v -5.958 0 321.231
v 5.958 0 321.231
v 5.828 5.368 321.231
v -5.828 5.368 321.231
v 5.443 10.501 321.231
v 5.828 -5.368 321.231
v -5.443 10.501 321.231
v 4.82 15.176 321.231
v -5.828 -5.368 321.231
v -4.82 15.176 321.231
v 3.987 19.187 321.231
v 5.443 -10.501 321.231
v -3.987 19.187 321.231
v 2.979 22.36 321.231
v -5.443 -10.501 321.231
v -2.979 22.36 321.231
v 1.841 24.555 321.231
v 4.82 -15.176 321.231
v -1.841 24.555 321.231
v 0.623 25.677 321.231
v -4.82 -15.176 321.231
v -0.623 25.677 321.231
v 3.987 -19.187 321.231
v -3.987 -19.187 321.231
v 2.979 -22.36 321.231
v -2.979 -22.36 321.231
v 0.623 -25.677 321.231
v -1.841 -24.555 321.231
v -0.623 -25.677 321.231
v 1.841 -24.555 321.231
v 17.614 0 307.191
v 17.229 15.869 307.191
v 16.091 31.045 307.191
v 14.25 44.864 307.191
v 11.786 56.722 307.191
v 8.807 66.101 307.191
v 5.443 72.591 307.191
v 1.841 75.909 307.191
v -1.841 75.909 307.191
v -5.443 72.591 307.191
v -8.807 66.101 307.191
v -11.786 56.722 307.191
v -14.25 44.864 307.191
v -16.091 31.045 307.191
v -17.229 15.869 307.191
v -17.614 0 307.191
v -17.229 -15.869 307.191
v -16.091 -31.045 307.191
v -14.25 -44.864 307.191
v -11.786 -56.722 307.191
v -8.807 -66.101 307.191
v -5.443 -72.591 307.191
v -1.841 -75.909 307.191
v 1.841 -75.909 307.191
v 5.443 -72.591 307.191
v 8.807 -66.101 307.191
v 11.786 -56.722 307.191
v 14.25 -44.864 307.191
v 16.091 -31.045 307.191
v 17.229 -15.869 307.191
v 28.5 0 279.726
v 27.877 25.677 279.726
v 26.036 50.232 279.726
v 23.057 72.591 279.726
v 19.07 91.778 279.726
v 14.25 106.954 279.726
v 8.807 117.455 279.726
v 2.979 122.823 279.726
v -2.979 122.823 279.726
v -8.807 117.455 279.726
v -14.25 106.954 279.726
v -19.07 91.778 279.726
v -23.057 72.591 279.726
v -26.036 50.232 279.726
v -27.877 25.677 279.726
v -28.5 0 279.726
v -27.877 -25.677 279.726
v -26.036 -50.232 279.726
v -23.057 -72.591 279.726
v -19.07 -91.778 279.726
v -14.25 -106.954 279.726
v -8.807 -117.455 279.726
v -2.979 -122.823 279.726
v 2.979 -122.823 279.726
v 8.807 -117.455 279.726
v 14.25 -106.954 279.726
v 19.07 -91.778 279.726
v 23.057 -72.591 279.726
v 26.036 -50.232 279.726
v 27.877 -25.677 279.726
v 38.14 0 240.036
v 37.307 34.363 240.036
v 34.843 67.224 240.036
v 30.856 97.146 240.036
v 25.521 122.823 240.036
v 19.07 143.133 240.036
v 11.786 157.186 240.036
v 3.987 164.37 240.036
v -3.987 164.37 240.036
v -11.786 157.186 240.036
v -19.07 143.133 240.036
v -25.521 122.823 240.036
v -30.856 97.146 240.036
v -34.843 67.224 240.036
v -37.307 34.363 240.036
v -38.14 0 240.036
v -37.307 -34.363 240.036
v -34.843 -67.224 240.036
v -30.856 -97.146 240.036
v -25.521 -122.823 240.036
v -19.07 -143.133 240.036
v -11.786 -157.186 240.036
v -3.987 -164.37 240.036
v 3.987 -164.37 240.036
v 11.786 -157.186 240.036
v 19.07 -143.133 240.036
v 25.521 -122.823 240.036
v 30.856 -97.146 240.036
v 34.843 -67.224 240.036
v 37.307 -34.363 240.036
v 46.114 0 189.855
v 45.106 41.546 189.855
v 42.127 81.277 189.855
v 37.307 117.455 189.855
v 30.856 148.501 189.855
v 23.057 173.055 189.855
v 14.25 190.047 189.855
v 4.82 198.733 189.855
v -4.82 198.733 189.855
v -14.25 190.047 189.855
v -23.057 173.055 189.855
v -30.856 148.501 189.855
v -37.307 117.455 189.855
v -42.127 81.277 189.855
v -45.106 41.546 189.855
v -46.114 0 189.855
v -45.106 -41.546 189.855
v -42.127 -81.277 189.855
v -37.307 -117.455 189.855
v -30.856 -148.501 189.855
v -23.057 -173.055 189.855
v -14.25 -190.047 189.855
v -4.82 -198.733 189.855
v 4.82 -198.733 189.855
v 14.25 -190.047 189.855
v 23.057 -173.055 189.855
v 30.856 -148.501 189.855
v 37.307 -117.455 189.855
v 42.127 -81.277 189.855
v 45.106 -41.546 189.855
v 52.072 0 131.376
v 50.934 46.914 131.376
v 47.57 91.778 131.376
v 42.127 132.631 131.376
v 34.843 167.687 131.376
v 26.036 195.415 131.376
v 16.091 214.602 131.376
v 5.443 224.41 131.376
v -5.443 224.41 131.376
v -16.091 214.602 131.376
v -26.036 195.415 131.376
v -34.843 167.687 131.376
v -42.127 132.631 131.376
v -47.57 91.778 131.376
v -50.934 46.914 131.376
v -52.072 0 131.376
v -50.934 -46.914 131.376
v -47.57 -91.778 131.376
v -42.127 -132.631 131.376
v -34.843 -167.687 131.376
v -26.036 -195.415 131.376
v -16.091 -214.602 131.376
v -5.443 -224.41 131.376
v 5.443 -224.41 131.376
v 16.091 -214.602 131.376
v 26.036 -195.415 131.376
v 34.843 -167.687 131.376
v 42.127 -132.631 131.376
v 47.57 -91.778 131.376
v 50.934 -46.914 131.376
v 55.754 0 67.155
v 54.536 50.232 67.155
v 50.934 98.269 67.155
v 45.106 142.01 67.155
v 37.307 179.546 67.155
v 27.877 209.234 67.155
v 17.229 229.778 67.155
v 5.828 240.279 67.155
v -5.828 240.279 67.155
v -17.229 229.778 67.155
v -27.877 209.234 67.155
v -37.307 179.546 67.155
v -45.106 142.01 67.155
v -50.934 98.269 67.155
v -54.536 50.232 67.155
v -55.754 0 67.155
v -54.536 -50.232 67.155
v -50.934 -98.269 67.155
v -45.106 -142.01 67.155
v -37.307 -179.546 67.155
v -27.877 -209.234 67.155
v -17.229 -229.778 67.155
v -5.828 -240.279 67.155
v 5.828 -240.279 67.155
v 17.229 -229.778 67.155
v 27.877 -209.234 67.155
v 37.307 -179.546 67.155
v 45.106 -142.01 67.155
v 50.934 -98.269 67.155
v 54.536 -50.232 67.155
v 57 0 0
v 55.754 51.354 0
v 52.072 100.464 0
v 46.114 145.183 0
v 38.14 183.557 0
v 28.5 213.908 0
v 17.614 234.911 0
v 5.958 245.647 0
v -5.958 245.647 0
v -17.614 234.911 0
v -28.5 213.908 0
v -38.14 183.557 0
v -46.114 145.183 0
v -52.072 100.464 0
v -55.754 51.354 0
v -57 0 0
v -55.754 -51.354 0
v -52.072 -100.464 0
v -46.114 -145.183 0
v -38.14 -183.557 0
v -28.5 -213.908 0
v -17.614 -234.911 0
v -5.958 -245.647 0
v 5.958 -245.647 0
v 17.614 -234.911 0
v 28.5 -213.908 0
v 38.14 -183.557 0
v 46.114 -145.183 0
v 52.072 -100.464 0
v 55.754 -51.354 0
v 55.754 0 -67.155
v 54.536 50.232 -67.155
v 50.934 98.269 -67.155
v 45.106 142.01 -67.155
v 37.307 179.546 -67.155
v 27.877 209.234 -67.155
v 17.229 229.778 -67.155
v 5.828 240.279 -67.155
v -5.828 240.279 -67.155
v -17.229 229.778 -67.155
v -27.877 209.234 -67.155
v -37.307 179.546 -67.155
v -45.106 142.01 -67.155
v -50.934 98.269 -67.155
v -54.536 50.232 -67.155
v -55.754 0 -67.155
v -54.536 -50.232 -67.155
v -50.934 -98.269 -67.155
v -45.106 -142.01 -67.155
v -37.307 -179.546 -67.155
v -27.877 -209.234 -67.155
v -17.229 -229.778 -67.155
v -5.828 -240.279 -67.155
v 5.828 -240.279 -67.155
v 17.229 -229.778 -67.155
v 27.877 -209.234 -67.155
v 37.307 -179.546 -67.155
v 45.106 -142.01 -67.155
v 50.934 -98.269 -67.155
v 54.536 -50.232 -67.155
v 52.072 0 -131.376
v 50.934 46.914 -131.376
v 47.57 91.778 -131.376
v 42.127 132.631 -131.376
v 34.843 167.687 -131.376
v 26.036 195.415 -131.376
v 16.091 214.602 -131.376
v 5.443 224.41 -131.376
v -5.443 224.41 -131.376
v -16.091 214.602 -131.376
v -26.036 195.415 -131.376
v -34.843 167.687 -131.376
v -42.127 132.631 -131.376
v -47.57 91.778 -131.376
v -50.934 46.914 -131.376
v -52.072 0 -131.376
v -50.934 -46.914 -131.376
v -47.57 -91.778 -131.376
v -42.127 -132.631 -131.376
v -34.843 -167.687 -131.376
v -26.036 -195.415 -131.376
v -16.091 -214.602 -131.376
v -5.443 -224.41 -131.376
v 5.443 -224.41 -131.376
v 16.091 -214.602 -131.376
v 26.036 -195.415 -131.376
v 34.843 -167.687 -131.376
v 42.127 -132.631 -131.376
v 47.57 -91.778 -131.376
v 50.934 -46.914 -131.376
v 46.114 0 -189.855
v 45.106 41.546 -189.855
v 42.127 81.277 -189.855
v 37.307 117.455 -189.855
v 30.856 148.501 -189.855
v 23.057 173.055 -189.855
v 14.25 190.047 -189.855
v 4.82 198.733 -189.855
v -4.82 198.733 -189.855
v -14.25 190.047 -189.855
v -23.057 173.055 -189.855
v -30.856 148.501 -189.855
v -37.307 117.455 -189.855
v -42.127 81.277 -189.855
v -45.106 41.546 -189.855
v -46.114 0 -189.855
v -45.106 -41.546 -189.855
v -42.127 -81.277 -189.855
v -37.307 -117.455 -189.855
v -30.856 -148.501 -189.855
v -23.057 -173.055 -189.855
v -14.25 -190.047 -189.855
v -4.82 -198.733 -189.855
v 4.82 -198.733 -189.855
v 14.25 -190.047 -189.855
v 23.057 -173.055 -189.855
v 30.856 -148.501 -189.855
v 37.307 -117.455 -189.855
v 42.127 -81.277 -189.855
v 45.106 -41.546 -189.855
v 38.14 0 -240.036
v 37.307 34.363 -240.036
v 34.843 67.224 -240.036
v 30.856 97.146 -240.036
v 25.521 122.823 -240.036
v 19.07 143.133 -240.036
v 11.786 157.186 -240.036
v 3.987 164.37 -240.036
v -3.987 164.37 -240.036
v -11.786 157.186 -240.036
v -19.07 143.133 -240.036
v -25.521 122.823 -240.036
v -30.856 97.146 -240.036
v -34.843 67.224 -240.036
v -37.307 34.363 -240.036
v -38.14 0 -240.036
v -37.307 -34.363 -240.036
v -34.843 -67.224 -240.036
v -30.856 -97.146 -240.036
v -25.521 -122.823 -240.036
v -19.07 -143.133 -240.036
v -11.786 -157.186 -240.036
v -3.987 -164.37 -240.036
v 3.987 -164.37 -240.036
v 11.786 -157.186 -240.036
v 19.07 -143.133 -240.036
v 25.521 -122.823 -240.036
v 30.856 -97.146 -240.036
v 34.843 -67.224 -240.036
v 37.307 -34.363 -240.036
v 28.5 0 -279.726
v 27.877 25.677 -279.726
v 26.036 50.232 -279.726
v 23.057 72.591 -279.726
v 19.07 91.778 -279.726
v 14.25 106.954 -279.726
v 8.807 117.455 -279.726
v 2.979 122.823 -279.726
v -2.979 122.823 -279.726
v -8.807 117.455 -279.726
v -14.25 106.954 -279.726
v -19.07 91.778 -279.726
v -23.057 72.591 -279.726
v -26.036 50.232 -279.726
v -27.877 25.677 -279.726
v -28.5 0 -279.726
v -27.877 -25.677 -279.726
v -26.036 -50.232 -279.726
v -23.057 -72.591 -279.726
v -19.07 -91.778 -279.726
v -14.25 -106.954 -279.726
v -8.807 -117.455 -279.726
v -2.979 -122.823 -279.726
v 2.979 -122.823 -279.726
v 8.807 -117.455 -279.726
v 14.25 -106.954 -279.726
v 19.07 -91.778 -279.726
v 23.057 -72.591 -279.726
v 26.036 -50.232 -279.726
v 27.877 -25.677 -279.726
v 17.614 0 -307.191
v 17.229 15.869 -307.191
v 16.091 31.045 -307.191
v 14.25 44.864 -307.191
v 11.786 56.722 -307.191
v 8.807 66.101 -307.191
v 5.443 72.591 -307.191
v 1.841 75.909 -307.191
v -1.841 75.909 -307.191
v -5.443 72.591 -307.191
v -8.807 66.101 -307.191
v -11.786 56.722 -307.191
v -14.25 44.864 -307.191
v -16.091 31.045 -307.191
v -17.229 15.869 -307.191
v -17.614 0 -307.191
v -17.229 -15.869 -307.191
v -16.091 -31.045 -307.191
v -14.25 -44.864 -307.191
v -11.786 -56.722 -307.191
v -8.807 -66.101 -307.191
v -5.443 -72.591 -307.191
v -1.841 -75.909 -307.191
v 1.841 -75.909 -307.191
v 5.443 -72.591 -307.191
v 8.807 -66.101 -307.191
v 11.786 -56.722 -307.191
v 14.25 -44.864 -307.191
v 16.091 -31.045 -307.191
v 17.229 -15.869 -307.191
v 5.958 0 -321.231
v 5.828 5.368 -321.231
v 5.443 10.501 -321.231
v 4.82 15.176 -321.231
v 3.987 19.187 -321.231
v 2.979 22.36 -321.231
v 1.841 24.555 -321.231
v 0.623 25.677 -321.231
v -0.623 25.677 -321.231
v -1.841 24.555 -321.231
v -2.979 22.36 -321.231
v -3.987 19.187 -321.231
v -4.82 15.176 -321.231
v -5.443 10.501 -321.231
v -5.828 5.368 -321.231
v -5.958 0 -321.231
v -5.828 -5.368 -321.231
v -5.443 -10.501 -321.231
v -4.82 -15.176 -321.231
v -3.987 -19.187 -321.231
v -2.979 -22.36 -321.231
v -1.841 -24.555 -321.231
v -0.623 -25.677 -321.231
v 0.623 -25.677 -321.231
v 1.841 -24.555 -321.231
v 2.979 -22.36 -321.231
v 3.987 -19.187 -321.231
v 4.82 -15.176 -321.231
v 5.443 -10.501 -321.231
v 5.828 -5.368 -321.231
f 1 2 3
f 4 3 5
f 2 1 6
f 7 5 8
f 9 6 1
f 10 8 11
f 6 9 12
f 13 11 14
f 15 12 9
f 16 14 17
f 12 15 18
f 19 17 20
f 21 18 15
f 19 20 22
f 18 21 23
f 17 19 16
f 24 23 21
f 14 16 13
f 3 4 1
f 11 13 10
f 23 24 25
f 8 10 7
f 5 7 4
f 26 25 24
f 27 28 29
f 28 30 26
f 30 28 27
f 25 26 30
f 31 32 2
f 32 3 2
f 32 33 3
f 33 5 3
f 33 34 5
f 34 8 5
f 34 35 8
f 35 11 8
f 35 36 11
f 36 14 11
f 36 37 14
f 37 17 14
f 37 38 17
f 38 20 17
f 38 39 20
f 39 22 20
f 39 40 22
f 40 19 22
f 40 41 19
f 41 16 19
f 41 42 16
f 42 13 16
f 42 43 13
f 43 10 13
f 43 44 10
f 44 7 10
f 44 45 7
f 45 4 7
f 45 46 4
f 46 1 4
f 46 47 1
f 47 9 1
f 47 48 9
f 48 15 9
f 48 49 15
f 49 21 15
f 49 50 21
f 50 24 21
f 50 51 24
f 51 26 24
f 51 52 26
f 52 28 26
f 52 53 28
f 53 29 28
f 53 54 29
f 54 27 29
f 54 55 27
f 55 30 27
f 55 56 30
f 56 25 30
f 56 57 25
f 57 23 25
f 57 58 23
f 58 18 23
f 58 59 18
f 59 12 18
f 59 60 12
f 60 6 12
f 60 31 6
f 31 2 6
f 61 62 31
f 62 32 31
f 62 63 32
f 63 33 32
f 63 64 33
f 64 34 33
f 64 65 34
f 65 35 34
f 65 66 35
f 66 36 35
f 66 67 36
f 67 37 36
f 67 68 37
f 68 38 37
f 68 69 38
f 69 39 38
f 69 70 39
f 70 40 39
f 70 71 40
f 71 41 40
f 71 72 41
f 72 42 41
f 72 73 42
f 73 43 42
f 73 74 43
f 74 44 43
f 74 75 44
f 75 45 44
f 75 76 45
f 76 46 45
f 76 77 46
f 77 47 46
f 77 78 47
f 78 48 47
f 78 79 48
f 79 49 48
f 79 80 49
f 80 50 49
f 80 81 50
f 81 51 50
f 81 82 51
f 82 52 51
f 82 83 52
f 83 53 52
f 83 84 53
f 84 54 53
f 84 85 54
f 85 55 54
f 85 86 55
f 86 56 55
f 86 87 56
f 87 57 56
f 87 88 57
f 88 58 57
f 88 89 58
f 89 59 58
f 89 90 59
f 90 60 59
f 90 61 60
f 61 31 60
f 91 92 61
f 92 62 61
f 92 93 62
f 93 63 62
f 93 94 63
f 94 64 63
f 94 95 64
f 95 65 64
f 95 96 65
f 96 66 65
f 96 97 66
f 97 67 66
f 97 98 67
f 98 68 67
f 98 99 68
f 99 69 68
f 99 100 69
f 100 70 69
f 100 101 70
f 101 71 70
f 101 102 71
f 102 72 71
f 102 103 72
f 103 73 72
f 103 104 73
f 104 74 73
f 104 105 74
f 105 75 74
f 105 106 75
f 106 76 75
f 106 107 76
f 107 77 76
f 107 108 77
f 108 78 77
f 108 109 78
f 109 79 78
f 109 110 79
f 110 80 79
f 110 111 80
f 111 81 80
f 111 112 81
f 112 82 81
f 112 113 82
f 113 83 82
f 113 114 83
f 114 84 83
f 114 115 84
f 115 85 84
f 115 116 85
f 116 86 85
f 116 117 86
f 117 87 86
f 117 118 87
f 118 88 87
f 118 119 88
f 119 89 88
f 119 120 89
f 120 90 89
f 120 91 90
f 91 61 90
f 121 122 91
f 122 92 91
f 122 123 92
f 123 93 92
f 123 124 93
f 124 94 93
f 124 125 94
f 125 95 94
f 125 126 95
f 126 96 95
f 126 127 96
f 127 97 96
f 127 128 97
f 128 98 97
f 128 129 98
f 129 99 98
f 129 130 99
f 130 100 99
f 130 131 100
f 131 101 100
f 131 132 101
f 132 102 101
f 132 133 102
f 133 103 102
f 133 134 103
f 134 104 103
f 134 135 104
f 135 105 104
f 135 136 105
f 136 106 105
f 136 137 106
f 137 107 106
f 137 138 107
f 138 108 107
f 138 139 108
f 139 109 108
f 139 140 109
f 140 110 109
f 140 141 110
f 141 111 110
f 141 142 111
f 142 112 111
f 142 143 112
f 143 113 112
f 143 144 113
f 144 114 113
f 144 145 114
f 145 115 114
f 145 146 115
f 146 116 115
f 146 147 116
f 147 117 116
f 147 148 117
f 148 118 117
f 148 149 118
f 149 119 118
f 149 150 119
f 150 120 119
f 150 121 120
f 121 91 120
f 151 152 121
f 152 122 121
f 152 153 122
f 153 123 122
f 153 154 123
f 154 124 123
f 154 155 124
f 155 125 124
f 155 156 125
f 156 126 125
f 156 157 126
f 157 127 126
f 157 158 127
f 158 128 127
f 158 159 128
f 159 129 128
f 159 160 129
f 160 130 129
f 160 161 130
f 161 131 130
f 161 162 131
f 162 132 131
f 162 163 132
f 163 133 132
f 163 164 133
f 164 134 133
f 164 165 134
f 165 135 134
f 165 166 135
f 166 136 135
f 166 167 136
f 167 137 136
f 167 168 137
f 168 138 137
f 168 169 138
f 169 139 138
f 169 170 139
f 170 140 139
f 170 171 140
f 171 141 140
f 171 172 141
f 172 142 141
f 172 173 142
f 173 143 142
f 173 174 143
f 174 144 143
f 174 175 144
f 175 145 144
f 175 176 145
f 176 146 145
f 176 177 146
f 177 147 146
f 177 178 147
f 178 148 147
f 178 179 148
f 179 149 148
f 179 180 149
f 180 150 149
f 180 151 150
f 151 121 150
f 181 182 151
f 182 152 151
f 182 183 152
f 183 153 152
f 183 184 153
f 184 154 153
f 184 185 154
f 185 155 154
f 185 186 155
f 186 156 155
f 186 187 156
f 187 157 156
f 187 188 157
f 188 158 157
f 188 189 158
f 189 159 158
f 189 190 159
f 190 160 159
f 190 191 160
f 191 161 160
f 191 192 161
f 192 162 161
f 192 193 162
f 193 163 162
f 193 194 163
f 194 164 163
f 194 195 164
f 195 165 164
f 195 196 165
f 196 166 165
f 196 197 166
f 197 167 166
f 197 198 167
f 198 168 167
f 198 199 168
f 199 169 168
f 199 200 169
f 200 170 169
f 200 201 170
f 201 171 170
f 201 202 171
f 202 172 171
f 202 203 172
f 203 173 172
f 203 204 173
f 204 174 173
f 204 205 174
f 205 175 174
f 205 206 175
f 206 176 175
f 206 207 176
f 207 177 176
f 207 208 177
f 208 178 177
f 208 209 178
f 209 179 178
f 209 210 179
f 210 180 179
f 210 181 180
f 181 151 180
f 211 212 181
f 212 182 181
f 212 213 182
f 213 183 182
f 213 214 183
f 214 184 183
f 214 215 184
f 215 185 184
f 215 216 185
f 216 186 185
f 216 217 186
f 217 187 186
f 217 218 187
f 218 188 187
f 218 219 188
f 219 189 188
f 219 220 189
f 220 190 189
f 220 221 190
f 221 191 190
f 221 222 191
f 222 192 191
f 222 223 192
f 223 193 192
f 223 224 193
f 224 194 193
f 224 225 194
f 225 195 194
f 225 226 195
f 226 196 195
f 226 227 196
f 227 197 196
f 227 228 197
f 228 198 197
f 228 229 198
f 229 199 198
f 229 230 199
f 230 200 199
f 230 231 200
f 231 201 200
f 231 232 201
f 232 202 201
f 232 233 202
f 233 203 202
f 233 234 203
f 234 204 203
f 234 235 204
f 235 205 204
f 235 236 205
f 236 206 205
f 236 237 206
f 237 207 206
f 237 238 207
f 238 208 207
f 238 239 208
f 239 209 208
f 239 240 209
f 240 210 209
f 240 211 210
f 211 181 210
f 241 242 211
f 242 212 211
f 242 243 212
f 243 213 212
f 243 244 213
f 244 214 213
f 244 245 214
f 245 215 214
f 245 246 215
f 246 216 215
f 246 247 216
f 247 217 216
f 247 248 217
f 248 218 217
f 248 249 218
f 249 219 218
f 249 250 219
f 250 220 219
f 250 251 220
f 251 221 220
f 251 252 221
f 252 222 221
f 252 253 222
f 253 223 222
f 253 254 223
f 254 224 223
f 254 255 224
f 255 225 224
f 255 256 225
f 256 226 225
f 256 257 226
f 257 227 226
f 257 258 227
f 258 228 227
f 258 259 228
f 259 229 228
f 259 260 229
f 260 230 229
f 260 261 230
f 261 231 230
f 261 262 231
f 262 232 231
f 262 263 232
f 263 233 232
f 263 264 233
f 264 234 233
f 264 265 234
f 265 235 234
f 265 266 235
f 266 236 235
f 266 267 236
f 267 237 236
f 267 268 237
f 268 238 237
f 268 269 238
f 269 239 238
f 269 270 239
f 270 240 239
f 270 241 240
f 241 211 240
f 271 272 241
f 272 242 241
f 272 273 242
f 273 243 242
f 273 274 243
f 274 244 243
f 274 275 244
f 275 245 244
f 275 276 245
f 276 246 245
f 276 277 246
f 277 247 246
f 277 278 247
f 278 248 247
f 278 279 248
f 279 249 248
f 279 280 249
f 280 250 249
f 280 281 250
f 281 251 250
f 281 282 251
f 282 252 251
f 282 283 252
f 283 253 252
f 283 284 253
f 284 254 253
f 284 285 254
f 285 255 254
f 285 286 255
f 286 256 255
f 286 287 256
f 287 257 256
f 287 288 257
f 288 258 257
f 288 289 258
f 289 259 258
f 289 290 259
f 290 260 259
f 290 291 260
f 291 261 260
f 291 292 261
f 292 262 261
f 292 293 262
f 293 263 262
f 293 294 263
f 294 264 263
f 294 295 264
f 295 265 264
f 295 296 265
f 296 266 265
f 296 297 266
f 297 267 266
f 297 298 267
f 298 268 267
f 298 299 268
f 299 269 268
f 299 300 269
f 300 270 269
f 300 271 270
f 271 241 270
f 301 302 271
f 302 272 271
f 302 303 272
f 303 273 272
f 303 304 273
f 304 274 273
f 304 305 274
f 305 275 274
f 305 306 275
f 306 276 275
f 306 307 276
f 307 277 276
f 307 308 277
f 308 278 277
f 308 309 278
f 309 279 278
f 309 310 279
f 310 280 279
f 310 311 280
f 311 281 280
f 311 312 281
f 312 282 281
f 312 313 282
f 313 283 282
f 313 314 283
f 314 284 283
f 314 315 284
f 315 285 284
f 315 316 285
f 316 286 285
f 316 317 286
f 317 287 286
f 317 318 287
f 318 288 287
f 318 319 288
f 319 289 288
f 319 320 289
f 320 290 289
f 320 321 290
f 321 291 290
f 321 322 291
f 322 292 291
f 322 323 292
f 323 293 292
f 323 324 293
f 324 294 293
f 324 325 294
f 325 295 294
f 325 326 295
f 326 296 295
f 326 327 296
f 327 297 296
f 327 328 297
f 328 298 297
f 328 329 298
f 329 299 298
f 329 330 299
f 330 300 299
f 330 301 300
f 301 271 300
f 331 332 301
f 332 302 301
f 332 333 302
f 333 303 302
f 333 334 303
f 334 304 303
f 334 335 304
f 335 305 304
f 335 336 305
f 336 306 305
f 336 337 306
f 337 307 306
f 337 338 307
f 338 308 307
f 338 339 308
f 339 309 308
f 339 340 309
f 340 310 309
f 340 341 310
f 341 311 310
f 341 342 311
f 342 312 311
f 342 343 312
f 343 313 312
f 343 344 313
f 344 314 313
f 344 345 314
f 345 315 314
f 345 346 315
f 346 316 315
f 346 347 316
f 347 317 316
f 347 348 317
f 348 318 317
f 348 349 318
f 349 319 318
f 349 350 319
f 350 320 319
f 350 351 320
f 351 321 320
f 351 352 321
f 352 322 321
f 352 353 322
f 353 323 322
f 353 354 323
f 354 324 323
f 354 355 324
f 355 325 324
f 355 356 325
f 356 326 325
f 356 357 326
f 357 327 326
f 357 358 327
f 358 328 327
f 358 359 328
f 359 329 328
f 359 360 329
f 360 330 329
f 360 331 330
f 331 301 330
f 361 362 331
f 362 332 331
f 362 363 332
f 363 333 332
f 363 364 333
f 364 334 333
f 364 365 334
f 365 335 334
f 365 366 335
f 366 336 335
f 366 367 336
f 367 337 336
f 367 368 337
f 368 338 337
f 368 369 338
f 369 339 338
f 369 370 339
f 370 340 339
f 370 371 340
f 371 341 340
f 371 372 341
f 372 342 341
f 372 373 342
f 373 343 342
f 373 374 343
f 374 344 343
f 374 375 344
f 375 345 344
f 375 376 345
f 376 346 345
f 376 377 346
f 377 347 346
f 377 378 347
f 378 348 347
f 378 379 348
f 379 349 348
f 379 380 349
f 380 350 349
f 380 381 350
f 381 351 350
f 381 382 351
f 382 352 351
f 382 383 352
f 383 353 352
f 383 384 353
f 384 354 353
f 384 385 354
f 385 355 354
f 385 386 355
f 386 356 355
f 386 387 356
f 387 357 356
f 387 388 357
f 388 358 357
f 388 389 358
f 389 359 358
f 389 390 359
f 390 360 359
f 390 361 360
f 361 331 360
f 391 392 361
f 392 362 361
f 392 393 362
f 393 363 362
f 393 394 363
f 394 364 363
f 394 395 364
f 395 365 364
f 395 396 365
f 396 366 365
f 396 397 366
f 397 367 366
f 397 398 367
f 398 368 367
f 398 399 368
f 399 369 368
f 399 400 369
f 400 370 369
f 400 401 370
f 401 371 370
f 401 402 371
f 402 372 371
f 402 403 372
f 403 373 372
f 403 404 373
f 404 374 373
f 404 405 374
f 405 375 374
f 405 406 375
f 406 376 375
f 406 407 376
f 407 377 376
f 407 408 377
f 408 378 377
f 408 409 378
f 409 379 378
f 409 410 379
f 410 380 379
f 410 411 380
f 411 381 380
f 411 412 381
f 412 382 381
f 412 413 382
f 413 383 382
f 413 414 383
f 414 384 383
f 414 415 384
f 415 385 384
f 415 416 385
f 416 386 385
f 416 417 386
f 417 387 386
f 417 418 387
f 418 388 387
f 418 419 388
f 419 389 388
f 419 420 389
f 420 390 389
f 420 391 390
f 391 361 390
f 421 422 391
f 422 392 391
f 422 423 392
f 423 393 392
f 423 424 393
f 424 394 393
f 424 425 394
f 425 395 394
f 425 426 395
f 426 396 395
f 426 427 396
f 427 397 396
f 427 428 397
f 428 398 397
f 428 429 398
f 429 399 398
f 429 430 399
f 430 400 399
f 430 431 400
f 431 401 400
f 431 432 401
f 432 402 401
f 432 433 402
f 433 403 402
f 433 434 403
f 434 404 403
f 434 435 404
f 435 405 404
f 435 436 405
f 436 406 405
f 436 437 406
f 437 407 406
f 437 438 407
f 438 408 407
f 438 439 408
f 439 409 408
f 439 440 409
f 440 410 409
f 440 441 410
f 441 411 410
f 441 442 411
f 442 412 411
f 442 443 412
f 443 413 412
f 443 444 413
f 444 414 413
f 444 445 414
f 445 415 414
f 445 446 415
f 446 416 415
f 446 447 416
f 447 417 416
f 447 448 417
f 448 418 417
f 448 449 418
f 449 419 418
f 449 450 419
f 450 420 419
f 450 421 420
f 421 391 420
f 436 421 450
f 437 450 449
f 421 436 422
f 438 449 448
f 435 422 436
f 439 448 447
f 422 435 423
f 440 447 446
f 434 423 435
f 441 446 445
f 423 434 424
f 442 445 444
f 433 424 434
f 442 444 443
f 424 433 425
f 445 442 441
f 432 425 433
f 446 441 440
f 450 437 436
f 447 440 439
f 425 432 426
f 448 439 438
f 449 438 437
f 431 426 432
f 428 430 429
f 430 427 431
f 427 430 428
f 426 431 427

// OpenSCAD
// Generated by SolidPython 1.0.1 on 2020-07-29 00:46:45


scale(v = [3, 13, 17]) {
	sphere(r = 19);
}
/***********************************************
*********      SolidPython code:      **********
************************************************
 
# import packages: SolidPython
from solid import *
from solid.utils import *
from itertools import chain, combinations, permutations


class Resize:

    def __init__(self, scad_file):
        self.scad_file = scad_file
        #self.scad_file = import_scad(scad_file)
        # cone/cylinder param:
        self.r1 = 0
        self.r2 = 0
        self.h = 0
        # rectangular prism param:
        self.w = 0
        self.l = 0
        # ellipse param:
        self.r = 0

    # import OpenScad code (file name corresponds to shape)


    # classify shape + parameters
    def assign(self, param1, param2, param3):
        if self.scad_file == 'cone.scad':
            self.r1 = param1
            self.r2 = param2
            self.h = param3
        elif self.scad_file == 'cylinder.scad':
            self.r1 = param1
            self.r2 = param2
            self.h = param3
        elif self.scad_file == 'rectangularPrism.scad':
            self.h = param1
            self.l = param2
            self.w = param3
        else:
            self.r = param1
            self.h = param2

    # resize parameters
    def iterate(self):
        x = range(3, 20, 2)
        i = 1
        if self.scad_file == 'cone.scad':
            tempList = list(permutations(x, 2))
            for temp in tempList:
                param1 = temp[0]
                param2 = temp[1]
                filepath = 'produced_scad_files/' + 'cone' + str(param1) + '_' + str(param2) + '_' + '.scad'
                scad_render_to_file(cylinder(h=param1, r1=param2, r2=0), filepath)

        elif self.scad_file == 'cylinder.scad':
            tempList = list(permutations(x, 3))
            for temp in tempList:
                param1 = temp[0]
                param2 = temp[1]
                filepath = 'produced_scad_files/' + 'cylinder' + str(param1) + '_' + str(param2) + '_' + '.scad'
                scad_render_to_file(cylinder(h=param1, r1=param2, r2=param2), filepath)

        elif self.scad_file == 'rectangularPrism.scad':
            tempList = list(permutations(x, 3))
            for temp in tempList:
                param1 = temp[0]
                param2 = temp[1]
                param3 = temp[2]
                filepath = 'produced_scad_files/' + 'rectangularPrism' + str(param1) + '_' + str(param2) + '_' + str(
                    param3) + '.scad'
                scad_render_to_file(cube(size=(param1, param2, param3)), filepath)

        elif self.scad_file == 'ellipse.scad':
            tempList = list(permutations(x, 4))
            for temp in tempList:
                param1 = temp[0]
                param2 = temp[1]
                param3 = temp[2]
                param4 = temp[3]
                filepath = 'produced_scad_files/' + 'ellipse' + str(param1) + '_' + str(param2) + '_' + str(param3) + '_' + str(param4) + '.scad'
                scad_render_to_file(scale([param1, param2, param3])(sphere(r=param4)), filepath)

    def render_to_scadfile(self):
        scad_render_to_file(scad, 'example.scad') 
 
************************************************/
